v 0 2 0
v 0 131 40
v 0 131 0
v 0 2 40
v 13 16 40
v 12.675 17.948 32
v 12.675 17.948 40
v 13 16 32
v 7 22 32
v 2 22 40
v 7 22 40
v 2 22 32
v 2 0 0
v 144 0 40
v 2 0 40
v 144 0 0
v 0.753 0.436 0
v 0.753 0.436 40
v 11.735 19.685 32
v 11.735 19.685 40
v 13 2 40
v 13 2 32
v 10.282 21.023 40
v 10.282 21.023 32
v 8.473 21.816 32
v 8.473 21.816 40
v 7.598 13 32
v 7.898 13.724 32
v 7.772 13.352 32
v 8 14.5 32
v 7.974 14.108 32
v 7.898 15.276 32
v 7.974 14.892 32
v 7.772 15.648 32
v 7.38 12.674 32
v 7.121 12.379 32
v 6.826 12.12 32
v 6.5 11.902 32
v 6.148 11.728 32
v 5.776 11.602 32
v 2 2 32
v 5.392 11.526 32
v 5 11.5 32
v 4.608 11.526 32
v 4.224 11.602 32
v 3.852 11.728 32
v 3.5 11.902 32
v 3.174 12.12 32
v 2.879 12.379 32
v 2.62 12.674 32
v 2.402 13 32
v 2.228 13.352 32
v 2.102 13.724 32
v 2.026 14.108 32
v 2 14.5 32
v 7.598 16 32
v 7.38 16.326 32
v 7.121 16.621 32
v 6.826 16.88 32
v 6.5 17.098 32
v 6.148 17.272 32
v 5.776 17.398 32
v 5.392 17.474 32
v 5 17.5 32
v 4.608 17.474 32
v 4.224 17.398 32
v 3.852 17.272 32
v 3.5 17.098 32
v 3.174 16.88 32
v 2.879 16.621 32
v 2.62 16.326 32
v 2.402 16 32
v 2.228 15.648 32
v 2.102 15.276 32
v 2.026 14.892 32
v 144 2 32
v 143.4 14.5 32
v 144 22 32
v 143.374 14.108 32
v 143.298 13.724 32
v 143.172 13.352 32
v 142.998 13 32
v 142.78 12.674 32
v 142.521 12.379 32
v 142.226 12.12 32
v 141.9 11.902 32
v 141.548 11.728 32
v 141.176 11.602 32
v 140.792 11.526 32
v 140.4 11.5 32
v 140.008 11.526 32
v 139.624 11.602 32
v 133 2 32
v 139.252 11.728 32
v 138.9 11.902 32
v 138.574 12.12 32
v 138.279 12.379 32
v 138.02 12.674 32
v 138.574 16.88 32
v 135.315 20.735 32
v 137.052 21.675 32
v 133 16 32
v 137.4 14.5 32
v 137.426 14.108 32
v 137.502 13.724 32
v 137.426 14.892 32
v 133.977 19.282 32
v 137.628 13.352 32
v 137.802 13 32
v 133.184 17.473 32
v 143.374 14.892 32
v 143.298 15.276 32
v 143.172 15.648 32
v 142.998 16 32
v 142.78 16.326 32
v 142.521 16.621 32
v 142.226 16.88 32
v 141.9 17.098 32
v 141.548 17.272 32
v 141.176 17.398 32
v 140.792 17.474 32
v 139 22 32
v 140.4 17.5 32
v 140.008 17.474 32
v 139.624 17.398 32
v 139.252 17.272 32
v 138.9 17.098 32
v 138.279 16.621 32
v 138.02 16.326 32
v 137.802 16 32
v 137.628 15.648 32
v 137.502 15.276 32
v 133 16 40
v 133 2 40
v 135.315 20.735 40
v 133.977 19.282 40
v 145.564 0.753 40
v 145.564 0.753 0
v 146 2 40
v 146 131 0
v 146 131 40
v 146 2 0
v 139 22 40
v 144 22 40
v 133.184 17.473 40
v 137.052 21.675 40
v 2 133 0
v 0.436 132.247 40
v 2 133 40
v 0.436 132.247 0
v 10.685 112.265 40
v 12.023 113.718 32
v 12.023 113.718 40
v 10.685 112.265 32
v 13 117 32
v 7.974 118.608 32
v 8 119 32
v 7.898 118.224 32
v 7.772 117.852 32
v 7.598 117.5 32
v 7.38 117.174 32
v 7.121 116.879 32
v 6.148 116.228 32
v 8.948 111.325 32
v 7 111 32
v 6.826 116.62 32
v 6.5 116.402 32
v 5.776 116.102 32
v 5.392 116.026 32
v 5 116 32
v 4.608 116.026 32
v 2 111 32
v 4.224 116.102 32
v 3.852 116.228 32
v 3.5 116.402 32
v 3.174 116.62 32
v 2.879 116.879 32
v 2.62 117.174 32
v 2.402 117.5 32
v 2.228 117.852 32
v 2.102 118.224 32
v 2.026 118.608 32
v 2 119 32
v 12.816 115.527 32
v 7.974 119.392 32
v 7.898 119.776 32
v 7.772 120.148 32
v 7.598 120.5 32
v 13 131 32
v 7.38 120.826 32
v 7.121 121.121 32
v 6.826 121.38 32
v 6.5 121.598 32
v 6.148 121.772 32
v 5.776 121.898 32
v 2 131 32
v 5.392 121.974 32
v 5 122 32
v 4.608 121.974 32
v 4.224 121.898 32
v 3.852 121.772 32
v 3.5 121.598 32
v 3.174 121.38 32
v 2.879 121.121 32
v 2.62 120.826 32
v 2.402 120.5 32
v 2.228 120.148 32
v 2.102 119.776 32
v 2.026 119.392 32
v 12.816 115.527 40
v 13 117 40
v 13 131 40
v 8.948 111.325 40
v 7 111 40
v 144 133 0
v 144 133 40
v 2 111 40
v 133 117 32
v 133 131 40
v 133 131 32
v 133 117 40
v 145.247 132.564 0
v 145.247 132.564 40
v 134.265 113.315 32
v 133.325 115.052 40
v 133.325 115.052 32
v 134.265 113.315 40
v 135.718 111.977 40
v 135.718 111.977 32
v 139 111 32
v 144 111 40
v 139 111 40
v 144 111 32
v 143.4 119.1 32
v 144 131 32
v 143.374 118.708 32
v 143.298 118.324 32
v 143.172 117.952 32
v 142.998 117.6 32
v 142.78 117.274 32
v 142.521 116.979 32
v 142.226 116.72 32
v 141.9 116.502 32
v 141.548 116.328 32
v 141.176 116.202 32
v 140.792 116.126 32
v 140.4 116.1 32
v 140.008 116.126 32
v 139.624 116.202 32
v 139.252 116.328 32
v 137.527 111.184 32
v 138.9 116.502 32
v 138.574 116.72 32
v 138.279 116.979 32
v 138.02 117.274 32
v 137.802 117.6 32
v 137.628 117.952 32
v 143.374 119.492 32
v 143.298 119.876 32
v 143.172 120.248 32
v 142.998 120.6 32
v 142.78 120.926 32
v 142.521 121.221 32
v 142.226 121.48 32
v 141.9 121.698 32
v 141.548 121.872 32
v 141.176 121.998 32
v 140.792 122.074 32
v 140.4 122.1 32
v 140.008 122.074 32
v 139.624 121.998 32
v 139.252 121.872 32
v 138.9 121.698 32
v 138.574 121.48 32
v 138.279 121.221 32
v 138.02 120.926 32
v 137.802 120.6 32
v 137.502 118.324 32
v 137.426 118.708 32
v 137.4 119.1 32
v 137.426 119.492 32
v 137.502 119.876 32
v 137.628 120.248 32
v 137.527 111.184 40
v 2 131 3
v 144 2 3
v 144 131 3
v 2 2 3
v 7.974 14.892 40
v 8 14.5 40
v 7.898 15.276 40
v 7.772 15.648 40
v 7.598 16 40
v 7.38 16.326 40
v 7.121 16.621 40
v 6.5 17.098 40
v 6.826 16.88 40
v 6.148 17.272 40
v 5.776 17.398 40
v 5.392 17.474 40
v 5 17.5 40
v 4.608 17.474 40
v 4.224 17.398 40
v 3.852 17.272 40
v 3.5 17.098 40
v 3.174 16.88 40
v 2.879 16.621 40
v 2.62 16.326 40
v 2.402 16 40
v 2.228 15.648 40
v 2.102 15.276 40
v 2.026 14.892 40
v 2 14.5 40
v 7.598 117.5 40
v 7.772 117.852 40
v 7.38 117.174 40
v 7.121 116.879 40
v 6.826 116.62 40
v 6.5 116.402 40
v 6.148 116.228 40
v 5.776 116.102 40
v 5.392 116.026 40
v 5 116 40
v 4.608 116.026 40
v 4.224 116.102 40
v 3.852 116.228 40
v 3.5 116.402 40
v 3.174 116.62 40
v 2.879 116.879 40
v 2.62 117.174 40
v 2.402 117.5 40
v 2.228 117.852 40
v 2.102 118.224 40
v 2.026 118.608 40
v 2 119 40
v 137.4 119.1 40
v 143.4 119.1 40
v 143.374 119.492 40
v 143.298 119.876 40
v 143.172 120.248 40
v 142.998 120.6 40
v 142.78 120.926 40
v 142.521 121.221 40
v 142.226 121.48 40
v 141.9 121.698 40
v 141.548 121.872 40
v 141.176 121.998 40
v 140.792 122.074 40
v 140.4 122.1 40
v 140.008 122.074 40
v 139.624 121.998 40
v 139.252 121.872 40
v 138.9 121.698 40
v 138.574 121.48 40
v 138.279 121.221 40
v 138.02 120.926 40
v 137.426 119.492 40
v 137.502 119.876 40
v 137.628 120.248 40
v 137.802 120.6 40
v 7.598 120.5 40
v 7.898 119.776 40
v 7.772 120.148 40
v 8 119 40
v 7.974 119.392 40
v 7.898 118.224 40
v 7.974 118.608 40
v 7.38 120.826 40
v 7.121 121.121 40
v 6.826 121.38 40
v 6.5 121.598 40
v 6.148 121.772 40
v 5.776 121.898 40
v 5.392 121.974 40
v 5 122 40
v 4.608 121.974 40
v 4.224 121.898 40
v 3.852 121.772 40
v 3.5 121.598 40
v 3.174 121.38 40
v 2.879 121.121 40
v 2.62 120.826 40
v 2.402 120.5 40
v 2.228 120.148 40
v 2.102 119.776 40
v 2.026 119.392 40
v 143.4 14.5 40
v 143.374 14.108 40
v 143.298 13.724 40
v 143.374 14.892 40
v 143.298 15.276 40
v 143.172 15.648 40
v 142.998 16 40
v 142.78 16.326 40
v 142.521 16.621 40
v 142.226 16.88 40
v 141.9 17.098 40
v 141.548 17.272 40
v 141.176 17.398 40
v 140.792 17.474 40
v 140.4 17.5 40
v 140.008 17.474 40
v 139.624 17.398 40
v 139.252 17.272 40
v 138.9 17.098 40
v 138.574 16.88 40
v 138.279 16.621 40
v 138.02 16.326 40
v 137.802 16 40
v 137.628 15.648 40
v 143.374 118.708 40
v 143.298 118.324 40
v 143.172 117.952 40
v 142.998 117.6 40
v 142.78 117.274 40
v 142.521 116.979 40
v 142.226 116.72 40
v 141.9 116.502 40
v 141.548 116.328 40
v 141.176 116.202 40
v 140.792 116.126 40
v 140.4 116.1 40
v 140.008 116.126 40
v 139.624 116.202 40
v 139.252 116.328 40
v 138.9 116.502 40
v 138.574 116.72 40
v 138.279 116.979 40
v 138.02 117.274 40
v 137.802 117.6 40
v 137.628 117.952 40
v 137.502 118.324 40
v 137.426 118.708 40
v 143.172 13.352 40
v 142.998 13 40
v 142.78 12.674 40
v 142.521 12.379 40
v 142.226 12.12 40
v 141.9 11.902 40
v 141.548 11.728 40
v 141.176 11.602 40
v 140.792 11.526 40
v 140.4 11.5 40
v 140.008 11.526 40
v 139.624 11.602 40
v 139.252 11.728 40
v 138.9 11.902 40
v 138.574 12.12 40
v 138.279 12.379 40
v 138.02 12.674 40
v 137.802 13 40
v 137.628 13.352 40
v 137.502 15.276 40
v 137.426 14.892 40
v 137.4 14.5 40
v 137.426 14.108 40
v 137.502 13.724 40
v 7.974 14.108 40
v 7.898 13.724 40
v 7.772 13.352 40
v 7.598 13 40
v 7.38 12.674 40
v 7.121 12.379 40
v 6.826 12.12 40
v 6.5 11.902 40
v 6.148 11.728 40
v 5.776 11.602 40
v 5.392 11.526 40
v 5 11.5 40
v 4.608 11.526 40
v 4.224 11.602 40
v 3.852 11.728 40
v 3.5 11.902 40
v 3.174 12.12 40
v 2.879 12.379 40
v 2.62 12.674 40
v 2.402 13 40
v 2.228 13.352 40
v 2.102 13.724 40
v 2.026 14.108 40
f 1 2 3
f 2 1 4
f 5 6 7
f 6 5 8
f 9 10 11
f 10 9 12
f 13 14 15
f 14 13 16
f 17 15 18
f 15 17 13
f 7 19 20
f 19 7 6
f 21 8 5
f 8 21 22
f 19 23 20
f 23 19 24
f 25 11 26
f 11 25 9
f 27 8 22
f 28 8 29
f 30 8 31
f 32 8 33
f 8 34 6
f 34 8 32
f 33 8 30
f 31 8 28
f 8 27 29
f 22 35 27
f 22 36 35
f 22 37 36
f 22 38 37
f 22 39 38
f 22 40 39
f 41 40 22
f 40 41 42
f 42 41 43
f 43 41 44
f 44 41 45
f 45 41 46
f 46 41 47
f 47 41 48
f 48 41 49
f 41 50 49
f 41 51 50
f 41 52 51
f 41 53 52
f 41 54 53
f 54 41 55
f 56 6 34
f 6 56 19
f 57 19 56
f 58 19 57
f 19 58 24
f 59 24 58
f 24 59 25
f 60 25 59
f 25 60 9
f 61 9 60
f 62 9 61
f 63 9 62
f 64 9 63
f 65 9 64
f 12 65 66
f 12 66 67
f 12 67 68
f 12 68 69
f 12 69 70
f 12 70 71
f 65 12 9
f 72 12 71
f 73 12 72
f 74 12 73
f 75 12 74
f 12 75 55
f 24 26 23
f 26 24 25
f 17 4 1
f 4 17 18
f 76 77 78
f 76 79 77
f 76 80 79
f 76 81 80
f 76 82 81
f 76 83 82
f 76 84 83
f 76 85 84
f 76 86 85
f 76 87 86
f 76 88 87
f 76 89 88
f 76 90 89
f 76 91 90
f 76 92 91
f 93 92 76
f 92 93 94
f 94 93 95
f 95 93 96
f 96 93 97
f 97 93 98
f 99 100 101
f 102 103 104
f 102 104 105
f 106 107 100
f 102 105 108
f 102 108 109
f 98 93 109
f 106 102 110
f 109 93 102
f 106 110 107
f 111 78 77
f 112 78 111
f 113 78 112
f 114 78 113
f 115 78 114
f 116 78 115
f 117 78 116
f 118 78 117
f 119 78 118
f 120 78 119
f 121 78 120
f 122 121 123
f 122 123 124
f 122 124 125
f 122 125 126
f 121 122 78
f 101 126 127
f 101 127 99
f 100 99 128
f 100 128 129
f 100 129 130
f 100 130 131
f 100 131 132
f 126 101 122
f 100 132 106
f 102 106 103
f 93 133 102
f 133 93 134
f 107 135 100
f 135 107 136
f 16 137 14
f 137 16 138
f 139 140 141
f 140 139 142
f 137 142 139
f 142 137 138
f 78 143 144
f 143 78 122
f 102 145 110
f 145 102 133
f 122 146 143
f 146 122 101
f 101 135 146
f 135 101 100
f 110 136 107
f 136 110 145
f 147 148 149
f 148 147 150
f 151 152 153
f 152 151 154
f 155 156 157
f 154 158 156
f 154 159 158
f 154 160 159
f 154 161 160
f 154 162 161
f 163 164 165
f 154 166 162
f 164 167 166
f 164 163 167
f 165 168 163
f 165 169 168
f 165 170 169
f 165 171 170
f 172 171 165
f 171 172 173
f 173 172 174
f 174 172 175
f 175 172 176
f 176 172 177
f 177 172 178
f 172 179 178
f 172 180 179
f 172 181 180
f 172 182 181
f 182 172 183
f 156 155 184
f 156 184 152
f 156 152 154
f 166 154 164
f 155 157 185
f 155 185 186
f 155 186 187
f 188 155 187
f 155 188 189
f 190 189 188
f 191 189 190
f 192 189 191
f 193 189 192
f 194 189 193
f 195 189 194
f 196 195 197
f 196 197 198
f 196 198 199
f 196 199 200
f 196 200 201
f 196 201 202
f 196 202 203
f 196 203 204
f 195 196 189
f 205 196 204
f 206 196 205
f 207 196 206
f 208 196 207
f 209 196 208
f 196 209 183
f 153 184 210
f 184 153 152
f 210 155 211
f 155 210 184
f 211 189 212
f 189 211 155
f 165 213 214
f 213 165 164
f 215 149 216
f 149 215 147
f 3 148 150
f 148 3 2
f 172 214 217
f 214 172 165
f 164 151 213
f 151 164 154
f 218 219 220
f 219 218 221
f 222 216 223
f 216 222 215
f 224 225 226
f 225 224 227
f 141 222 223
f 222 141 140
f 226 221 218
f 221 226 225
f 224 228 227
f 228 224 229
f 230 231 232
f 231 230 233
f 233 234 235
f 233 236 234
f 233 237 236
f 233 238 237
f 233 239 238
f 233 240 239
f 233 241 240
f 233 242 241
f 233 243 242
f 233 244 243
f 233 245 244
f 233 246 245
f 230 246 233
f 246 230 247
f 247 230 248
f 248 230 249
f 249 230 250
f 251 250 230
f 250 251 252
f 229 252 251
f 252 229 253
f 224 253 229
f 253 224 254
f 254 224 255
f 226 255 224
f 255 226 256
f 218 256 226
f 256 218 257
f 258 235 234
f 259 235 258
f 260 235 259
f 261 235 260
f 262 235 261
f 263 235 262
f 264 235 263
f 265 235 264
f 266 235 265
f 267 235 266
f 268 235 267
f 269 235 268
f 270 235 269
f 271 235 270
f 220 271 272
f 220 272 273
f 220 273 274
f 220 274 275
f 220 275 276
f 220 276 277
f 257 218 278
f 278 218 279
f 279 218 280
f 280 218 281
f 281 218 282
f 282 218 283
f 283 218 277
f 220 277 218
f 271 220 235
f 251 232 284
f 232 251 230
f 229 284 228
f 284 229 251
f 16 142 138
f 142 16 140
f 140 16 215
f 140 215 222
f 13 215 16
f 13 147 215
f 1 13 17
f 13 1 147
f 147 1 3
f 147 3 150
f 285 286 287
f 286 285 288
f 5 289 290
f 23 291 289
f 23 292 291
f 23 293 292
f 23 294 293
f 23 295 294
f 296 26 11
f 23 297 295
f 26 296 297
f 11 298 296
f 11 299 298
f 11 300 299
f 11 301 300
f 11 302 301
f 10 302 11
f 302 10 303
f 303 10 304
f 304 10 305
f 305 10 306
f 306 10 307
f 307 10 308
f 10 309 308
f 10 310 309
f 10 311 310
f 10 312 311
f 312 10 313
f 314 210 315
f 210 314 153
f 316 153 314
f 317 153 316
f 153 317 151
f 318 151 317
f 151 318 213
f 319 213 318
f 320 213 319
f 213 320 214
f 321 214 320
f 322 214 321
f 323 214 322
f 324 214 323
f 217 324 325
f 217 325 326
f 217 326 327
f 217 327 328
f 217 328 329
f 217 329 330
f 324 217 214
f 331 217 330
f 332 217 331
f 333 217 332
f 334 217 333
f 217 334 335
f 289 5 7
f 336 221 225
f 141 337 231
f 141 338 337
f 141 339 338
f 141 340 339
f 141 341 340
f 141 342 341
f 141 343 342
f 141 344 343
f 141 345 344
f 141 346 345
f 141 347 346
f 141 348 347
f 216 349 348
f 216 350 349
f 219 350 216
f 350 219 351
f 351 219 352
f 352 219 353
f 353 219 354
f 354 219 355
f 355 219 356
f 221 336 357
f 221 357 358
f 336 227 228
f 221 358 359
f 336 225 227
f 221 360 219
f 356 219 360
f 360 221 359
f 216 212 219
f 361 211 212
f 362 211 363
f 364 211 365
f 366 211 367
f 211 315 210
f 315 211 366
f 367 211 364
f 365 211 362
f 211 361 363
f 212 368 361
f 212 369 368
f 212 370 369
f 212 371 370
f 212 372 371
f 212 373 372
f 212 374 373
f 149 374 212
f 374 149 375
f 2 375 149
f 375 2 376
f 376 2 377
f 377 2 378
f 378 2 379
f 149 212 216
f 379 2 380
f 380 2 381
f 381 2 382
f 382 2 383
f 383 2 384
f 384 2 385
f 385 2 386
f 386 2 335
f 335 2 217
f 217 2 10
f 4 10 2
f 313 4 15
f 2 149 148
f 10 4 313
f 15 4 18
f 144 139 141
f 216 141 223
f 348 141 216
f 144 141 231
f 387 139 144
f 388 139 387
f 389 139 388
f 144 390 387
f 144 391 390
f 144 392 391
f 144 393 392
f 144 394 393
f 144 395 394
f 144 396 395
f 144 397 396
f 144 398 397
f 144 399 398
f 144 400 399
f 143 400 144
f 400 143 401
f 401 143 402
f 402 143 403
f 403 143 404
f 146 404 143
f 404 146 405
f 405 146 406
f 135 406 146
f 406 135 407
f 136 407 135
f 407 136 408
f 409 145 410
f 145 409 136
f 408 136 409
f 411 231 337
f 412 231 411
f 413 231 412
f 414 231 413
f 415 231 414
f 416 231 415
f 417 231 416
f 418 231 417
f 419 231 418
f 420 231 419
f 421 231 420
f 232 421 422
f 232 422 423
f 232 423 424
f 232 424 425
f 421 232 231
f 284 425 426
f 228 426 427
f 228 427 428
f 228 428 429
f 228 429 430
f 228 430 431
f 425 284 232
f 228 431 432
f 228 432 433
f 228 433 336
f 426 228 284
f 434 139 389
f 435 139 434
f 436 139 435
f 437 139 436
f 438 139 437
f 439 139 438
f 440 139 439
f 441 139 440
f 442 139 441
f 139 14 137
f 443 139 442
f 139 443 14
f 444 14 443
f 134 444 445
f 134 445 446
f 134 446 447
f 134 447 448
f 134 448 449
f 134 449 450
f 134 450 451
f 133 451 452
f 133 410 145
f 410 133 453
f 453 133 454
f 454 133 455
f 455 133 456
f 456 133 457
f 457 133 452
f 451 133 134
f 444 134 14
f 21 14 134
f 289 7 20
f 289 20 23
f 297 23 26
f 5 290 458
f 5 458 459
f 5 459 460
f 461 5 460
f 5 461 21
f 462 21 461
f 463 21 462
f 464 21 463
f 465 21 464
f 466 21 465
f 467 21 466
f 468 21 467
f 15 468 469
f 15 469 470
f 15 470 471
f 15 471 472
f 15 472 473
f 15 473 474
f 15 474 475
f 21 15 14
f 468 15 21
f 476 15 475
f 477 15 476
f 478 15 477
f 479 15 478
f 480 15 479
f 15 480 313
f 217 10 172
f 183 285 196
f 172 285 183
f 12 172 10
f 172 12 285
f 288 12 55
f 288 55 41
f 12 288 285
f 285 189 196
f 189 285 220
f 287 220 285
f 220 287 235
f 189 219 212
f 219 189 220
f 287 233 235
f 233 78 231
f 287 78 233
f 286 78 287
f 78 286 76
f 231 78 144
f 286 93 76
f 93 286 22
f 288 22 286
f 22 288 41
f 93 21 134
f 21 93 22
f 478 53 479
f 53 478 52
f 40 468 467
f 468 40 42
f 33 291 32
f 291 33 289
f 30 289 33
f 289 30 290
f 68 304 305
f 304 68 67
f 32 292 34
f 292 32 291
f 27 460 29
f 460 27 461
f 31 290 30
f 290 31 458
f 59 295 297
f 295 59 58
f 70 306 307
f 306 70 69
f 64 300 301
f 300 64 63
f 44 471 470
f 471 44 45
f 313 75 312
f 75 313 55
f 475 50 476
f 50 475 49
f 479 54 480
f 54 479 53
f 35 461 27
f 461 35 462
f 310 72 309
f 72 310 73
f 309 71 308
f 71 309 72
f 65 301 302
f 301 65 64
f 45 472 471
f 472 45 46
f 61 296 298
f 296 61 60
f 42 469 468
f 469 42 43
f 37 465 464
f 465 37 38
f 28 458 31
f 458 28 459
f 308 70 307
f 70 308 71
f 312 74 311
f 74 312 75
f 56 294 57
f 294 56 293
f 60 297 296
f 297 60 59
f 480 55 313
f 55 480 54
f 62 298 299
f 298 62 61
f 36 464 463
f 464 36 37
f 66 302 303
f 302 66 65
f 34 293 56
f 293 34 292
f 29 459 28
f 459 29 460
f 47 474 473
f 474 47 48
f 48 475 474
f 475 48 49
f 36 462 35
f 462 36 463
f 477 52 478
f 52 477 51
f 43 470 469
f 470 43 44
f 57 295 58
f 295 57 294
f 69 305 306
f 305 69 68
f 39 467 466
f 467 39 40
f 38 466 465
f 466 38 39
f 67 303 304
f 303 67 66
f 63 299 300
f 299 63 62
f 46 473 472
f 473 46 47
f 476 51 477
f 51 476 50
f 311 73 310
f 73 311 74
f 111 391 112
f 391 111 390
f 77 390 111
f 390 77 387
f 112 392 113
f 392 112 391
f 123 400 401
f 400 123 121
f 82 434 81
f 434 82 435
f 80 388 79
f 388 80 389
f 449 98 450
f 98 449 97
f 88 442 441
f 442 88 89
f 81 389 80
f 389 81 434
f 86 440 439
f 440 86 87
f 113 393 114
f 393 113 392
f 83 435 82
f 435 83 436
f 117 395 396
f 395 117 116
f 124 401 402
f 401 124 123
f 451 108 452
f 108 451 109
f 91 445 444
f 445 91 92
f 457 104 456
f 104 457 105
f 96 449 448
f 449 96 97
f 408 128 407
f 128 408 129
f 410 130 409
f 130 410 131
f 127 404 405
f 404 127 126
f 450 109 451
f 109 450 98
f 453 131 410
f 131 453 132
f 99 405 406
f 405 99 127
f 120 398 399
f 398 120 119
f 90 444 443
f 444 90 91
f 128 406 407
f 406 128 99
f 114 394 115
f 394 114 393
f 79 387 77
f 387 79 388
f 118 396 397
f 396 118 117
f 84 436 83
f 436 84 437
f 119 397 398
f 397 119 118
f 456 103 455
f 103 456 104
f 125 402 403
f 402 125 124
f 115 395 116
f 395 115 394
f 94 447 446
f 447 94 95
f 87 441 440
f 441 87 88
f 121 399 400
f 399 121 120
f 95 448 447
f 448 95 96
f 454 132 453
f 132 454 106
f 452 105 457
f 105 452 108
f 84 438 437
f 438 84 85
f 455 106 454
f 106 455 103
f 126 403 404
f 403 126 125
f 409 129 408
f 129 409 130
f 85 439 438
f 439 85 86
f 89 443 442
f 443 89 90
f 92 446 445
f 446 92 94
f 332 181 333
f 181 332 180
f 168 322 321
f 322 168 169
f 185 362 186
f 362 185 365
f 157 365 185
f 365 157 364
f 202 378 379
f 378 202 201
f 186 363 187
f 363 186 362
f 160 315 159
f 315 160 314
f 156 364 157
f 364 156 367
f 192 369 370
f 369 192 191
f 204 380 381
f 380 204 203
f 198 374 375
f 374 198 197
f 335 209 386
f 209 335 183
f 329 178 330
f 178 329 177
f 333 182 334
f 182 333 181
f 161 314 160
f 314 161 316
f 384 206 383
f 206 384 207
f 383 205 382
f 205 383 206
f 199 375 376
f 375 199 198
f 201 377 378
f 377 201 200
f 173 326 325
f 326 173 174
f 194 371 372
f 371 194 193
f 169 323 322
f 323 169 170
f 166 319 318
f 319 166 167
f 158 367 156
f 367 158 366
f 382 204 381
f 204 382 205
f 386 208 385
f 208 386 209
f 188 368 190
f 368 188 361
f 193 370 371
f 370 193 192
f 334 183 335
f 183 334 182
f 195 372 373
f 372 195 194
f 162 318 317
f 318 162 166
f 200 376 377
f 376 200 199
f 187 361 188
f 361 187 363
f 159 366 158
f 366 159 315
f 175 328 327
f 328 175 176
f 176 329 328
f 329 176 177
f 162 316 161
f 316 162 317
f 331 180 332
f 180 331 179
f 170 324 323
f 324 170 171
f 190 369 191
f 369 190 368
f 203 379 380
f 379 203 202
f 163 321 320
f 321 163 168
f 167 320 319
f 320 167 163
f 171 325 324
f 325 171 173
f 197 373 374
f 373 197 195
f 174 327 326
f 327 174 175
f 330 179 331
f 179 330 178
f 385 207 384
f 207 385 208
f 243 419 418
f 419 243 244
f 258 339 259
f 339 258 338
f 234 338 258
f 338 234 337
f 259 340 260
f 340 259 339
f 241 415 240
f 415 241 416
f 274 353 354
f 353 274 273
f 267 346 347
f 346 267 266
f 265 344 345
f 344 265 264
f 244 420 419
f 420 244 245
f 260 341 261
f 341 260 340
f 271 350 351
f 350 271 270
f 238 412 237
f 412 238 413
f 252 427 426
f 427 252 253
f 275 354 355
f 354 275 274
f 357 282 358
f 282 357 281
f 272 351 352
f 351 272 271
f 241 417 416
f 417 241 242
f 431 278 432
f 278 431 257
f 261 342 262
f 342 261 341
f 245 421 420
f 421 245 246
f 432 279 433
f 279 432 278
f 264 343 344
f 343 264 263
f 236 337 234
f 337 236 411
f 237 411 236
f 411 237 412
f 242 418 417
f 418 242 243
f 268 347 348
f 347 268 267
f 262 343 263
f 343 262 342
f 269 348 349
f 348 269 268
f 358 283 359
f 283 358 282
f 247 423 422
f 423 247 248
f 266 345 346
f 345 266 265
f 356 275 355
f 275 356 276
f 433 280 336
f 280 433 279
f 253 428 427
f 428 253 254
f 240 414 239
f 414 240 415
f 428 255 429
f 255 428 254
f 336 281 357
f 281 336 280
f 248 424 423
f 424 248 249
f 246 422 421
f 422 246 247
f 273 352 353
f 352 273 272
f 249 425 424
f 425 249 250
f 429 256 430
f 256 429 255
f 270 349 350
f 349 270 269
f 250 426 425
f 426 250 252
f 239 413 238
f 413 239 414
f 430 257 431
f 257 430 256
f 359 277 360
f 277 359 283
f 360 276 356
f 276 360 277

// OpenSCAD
// ARC-210 shallow open-top case
// Units: millimetres
// The XY outline matches the 146 x 133 mm faceplate template; Z is depth.

outer_width = 146;
outer_height = 133;
case_depth = 40;
wall_thickness = 2;
floor_thickness = 3;
outer_corner_radius = 2;

// Through-holes matching the M1-M4 locations in the SVG. They pass through
// the upper mounting pads from the open/top face.
mounting_hole_diameter = 6;  // SVG radius is 3 mm
mounting_feature_depth = 28; // 20 mm taper + 8 mm top pad
mounting_pad_thickness = 8;  // flat top pad; holes pass through this section
mounting_gusset_height = mounting_feature_depth - mounting_pad_thickness;
mounting_holes = [
    [5.0, 14.5],    // M1
    [140.4, 14.5],  // M2
    [5.0, 119.0],   // M3
    [140.4, 119.1]  // M4
];

// The SVG's four black mounting blocks are clipped 26 x 44 mm rounded
// rectangles whose centres sit on the corners of the faceplate.
corner_block_width = 26;
corner_block_height = 44;
corner_block_radius = 6;
corner_blocks = [
    [-13, -22],
    [133, -22],
    [-13, 111],
    [133, 111]
];
corner_outward_shifts = [
    [-11, -20],
    [11, -20],
    [-11, 20],
    [11, 20]
];

module rounded_rectangle(size, radius) {
    translate([radius, radius])
        offset(r = radius)
            square([size[0] - 2*radius, size[1] - 2*radius]);
}

module outer_profile() {
    rounded_rectangle([outer_width, outer_height], outer_corner_radius);
}

module wall_profile() {
    // The 2 mm perimeter walls continue through the full case depth.
    intersection() {
        outer_profile();
        union() {
            square([outer_width, wall_thickness]);
            translate([0, outer_height - wall_thickness])
                square([outer_width, wall_thickness]);
            square([wall_thickness, outer_height]);
            translate([outer_width - wall_thickness, 0])
                square([wall_thickness, outer_height]);
        }
    }
}

module corner_profile(p) {
    intersection() {
        outer_profile();
        translate(p)
            rounded_rectangle(
                [corner_block_width, corner_block_height],
                corner_block_radius);
    }
}

module mounting_profile() {
    // Full mounting-pad footprint, used for the top 8 mm.
    intersection() {
        outer_profile();
        union() {
            for (p = corner_blocks)
                corner_profile(p);
        }
    }
}

module mounting_gussets() {
    // Each gusset starts at the inside faces of the 2 mm walls and grows to
    // the pad over 20 mm of height. The limiting direction is exactly 45°;
    // the other direction is steeper and therefore also support-free.
    for (i = [0 : len(corner_blocks) - 1])
        hull() {
            p = corner_blocks[i];
            s = corner_outward_shifts[i];
            translate([0, 0, case_depth - mounting_feature_depth])
                linear_extrude(height = 0.01)
                    corner_profile([p[0] + s[0], p[1] + s[1]]);
            translate([0, 0, case_depth - mounting_pad_thickness])
                linear_extrude(height = 0.01)
                    corner_profile(p);
        }
}

module case_body() {
    difference() {
        union() {
            // Full outer-profile floor, full-height walls, and upper pads.
            linear_extrude(height = floor_thickness)
                outer_profile();
            linear_extrude(height = case_depth)
                wall_profile();
            translate([0, 0, case_depth - mounting_pad_thickness])
                linear_extrude(height = mounting_pad_thickness)
                    mounting_profile();
            mounting_gussets();
        }

        // Through-holes in the upper 8 mm mounting pads. The small overlap at
        // either end guarantees a clean cut through the pad surfaces.
        for (p = mounting_holes)
            translate([p[0], p[1], case_depth - mounting_pad_thickness - 0.1])
                cylinder(h = mounting_pad_thickness + 0.2,
                         d = mounting_hole_diameter,
                         $fn = 48);
    }
}

case_body();
